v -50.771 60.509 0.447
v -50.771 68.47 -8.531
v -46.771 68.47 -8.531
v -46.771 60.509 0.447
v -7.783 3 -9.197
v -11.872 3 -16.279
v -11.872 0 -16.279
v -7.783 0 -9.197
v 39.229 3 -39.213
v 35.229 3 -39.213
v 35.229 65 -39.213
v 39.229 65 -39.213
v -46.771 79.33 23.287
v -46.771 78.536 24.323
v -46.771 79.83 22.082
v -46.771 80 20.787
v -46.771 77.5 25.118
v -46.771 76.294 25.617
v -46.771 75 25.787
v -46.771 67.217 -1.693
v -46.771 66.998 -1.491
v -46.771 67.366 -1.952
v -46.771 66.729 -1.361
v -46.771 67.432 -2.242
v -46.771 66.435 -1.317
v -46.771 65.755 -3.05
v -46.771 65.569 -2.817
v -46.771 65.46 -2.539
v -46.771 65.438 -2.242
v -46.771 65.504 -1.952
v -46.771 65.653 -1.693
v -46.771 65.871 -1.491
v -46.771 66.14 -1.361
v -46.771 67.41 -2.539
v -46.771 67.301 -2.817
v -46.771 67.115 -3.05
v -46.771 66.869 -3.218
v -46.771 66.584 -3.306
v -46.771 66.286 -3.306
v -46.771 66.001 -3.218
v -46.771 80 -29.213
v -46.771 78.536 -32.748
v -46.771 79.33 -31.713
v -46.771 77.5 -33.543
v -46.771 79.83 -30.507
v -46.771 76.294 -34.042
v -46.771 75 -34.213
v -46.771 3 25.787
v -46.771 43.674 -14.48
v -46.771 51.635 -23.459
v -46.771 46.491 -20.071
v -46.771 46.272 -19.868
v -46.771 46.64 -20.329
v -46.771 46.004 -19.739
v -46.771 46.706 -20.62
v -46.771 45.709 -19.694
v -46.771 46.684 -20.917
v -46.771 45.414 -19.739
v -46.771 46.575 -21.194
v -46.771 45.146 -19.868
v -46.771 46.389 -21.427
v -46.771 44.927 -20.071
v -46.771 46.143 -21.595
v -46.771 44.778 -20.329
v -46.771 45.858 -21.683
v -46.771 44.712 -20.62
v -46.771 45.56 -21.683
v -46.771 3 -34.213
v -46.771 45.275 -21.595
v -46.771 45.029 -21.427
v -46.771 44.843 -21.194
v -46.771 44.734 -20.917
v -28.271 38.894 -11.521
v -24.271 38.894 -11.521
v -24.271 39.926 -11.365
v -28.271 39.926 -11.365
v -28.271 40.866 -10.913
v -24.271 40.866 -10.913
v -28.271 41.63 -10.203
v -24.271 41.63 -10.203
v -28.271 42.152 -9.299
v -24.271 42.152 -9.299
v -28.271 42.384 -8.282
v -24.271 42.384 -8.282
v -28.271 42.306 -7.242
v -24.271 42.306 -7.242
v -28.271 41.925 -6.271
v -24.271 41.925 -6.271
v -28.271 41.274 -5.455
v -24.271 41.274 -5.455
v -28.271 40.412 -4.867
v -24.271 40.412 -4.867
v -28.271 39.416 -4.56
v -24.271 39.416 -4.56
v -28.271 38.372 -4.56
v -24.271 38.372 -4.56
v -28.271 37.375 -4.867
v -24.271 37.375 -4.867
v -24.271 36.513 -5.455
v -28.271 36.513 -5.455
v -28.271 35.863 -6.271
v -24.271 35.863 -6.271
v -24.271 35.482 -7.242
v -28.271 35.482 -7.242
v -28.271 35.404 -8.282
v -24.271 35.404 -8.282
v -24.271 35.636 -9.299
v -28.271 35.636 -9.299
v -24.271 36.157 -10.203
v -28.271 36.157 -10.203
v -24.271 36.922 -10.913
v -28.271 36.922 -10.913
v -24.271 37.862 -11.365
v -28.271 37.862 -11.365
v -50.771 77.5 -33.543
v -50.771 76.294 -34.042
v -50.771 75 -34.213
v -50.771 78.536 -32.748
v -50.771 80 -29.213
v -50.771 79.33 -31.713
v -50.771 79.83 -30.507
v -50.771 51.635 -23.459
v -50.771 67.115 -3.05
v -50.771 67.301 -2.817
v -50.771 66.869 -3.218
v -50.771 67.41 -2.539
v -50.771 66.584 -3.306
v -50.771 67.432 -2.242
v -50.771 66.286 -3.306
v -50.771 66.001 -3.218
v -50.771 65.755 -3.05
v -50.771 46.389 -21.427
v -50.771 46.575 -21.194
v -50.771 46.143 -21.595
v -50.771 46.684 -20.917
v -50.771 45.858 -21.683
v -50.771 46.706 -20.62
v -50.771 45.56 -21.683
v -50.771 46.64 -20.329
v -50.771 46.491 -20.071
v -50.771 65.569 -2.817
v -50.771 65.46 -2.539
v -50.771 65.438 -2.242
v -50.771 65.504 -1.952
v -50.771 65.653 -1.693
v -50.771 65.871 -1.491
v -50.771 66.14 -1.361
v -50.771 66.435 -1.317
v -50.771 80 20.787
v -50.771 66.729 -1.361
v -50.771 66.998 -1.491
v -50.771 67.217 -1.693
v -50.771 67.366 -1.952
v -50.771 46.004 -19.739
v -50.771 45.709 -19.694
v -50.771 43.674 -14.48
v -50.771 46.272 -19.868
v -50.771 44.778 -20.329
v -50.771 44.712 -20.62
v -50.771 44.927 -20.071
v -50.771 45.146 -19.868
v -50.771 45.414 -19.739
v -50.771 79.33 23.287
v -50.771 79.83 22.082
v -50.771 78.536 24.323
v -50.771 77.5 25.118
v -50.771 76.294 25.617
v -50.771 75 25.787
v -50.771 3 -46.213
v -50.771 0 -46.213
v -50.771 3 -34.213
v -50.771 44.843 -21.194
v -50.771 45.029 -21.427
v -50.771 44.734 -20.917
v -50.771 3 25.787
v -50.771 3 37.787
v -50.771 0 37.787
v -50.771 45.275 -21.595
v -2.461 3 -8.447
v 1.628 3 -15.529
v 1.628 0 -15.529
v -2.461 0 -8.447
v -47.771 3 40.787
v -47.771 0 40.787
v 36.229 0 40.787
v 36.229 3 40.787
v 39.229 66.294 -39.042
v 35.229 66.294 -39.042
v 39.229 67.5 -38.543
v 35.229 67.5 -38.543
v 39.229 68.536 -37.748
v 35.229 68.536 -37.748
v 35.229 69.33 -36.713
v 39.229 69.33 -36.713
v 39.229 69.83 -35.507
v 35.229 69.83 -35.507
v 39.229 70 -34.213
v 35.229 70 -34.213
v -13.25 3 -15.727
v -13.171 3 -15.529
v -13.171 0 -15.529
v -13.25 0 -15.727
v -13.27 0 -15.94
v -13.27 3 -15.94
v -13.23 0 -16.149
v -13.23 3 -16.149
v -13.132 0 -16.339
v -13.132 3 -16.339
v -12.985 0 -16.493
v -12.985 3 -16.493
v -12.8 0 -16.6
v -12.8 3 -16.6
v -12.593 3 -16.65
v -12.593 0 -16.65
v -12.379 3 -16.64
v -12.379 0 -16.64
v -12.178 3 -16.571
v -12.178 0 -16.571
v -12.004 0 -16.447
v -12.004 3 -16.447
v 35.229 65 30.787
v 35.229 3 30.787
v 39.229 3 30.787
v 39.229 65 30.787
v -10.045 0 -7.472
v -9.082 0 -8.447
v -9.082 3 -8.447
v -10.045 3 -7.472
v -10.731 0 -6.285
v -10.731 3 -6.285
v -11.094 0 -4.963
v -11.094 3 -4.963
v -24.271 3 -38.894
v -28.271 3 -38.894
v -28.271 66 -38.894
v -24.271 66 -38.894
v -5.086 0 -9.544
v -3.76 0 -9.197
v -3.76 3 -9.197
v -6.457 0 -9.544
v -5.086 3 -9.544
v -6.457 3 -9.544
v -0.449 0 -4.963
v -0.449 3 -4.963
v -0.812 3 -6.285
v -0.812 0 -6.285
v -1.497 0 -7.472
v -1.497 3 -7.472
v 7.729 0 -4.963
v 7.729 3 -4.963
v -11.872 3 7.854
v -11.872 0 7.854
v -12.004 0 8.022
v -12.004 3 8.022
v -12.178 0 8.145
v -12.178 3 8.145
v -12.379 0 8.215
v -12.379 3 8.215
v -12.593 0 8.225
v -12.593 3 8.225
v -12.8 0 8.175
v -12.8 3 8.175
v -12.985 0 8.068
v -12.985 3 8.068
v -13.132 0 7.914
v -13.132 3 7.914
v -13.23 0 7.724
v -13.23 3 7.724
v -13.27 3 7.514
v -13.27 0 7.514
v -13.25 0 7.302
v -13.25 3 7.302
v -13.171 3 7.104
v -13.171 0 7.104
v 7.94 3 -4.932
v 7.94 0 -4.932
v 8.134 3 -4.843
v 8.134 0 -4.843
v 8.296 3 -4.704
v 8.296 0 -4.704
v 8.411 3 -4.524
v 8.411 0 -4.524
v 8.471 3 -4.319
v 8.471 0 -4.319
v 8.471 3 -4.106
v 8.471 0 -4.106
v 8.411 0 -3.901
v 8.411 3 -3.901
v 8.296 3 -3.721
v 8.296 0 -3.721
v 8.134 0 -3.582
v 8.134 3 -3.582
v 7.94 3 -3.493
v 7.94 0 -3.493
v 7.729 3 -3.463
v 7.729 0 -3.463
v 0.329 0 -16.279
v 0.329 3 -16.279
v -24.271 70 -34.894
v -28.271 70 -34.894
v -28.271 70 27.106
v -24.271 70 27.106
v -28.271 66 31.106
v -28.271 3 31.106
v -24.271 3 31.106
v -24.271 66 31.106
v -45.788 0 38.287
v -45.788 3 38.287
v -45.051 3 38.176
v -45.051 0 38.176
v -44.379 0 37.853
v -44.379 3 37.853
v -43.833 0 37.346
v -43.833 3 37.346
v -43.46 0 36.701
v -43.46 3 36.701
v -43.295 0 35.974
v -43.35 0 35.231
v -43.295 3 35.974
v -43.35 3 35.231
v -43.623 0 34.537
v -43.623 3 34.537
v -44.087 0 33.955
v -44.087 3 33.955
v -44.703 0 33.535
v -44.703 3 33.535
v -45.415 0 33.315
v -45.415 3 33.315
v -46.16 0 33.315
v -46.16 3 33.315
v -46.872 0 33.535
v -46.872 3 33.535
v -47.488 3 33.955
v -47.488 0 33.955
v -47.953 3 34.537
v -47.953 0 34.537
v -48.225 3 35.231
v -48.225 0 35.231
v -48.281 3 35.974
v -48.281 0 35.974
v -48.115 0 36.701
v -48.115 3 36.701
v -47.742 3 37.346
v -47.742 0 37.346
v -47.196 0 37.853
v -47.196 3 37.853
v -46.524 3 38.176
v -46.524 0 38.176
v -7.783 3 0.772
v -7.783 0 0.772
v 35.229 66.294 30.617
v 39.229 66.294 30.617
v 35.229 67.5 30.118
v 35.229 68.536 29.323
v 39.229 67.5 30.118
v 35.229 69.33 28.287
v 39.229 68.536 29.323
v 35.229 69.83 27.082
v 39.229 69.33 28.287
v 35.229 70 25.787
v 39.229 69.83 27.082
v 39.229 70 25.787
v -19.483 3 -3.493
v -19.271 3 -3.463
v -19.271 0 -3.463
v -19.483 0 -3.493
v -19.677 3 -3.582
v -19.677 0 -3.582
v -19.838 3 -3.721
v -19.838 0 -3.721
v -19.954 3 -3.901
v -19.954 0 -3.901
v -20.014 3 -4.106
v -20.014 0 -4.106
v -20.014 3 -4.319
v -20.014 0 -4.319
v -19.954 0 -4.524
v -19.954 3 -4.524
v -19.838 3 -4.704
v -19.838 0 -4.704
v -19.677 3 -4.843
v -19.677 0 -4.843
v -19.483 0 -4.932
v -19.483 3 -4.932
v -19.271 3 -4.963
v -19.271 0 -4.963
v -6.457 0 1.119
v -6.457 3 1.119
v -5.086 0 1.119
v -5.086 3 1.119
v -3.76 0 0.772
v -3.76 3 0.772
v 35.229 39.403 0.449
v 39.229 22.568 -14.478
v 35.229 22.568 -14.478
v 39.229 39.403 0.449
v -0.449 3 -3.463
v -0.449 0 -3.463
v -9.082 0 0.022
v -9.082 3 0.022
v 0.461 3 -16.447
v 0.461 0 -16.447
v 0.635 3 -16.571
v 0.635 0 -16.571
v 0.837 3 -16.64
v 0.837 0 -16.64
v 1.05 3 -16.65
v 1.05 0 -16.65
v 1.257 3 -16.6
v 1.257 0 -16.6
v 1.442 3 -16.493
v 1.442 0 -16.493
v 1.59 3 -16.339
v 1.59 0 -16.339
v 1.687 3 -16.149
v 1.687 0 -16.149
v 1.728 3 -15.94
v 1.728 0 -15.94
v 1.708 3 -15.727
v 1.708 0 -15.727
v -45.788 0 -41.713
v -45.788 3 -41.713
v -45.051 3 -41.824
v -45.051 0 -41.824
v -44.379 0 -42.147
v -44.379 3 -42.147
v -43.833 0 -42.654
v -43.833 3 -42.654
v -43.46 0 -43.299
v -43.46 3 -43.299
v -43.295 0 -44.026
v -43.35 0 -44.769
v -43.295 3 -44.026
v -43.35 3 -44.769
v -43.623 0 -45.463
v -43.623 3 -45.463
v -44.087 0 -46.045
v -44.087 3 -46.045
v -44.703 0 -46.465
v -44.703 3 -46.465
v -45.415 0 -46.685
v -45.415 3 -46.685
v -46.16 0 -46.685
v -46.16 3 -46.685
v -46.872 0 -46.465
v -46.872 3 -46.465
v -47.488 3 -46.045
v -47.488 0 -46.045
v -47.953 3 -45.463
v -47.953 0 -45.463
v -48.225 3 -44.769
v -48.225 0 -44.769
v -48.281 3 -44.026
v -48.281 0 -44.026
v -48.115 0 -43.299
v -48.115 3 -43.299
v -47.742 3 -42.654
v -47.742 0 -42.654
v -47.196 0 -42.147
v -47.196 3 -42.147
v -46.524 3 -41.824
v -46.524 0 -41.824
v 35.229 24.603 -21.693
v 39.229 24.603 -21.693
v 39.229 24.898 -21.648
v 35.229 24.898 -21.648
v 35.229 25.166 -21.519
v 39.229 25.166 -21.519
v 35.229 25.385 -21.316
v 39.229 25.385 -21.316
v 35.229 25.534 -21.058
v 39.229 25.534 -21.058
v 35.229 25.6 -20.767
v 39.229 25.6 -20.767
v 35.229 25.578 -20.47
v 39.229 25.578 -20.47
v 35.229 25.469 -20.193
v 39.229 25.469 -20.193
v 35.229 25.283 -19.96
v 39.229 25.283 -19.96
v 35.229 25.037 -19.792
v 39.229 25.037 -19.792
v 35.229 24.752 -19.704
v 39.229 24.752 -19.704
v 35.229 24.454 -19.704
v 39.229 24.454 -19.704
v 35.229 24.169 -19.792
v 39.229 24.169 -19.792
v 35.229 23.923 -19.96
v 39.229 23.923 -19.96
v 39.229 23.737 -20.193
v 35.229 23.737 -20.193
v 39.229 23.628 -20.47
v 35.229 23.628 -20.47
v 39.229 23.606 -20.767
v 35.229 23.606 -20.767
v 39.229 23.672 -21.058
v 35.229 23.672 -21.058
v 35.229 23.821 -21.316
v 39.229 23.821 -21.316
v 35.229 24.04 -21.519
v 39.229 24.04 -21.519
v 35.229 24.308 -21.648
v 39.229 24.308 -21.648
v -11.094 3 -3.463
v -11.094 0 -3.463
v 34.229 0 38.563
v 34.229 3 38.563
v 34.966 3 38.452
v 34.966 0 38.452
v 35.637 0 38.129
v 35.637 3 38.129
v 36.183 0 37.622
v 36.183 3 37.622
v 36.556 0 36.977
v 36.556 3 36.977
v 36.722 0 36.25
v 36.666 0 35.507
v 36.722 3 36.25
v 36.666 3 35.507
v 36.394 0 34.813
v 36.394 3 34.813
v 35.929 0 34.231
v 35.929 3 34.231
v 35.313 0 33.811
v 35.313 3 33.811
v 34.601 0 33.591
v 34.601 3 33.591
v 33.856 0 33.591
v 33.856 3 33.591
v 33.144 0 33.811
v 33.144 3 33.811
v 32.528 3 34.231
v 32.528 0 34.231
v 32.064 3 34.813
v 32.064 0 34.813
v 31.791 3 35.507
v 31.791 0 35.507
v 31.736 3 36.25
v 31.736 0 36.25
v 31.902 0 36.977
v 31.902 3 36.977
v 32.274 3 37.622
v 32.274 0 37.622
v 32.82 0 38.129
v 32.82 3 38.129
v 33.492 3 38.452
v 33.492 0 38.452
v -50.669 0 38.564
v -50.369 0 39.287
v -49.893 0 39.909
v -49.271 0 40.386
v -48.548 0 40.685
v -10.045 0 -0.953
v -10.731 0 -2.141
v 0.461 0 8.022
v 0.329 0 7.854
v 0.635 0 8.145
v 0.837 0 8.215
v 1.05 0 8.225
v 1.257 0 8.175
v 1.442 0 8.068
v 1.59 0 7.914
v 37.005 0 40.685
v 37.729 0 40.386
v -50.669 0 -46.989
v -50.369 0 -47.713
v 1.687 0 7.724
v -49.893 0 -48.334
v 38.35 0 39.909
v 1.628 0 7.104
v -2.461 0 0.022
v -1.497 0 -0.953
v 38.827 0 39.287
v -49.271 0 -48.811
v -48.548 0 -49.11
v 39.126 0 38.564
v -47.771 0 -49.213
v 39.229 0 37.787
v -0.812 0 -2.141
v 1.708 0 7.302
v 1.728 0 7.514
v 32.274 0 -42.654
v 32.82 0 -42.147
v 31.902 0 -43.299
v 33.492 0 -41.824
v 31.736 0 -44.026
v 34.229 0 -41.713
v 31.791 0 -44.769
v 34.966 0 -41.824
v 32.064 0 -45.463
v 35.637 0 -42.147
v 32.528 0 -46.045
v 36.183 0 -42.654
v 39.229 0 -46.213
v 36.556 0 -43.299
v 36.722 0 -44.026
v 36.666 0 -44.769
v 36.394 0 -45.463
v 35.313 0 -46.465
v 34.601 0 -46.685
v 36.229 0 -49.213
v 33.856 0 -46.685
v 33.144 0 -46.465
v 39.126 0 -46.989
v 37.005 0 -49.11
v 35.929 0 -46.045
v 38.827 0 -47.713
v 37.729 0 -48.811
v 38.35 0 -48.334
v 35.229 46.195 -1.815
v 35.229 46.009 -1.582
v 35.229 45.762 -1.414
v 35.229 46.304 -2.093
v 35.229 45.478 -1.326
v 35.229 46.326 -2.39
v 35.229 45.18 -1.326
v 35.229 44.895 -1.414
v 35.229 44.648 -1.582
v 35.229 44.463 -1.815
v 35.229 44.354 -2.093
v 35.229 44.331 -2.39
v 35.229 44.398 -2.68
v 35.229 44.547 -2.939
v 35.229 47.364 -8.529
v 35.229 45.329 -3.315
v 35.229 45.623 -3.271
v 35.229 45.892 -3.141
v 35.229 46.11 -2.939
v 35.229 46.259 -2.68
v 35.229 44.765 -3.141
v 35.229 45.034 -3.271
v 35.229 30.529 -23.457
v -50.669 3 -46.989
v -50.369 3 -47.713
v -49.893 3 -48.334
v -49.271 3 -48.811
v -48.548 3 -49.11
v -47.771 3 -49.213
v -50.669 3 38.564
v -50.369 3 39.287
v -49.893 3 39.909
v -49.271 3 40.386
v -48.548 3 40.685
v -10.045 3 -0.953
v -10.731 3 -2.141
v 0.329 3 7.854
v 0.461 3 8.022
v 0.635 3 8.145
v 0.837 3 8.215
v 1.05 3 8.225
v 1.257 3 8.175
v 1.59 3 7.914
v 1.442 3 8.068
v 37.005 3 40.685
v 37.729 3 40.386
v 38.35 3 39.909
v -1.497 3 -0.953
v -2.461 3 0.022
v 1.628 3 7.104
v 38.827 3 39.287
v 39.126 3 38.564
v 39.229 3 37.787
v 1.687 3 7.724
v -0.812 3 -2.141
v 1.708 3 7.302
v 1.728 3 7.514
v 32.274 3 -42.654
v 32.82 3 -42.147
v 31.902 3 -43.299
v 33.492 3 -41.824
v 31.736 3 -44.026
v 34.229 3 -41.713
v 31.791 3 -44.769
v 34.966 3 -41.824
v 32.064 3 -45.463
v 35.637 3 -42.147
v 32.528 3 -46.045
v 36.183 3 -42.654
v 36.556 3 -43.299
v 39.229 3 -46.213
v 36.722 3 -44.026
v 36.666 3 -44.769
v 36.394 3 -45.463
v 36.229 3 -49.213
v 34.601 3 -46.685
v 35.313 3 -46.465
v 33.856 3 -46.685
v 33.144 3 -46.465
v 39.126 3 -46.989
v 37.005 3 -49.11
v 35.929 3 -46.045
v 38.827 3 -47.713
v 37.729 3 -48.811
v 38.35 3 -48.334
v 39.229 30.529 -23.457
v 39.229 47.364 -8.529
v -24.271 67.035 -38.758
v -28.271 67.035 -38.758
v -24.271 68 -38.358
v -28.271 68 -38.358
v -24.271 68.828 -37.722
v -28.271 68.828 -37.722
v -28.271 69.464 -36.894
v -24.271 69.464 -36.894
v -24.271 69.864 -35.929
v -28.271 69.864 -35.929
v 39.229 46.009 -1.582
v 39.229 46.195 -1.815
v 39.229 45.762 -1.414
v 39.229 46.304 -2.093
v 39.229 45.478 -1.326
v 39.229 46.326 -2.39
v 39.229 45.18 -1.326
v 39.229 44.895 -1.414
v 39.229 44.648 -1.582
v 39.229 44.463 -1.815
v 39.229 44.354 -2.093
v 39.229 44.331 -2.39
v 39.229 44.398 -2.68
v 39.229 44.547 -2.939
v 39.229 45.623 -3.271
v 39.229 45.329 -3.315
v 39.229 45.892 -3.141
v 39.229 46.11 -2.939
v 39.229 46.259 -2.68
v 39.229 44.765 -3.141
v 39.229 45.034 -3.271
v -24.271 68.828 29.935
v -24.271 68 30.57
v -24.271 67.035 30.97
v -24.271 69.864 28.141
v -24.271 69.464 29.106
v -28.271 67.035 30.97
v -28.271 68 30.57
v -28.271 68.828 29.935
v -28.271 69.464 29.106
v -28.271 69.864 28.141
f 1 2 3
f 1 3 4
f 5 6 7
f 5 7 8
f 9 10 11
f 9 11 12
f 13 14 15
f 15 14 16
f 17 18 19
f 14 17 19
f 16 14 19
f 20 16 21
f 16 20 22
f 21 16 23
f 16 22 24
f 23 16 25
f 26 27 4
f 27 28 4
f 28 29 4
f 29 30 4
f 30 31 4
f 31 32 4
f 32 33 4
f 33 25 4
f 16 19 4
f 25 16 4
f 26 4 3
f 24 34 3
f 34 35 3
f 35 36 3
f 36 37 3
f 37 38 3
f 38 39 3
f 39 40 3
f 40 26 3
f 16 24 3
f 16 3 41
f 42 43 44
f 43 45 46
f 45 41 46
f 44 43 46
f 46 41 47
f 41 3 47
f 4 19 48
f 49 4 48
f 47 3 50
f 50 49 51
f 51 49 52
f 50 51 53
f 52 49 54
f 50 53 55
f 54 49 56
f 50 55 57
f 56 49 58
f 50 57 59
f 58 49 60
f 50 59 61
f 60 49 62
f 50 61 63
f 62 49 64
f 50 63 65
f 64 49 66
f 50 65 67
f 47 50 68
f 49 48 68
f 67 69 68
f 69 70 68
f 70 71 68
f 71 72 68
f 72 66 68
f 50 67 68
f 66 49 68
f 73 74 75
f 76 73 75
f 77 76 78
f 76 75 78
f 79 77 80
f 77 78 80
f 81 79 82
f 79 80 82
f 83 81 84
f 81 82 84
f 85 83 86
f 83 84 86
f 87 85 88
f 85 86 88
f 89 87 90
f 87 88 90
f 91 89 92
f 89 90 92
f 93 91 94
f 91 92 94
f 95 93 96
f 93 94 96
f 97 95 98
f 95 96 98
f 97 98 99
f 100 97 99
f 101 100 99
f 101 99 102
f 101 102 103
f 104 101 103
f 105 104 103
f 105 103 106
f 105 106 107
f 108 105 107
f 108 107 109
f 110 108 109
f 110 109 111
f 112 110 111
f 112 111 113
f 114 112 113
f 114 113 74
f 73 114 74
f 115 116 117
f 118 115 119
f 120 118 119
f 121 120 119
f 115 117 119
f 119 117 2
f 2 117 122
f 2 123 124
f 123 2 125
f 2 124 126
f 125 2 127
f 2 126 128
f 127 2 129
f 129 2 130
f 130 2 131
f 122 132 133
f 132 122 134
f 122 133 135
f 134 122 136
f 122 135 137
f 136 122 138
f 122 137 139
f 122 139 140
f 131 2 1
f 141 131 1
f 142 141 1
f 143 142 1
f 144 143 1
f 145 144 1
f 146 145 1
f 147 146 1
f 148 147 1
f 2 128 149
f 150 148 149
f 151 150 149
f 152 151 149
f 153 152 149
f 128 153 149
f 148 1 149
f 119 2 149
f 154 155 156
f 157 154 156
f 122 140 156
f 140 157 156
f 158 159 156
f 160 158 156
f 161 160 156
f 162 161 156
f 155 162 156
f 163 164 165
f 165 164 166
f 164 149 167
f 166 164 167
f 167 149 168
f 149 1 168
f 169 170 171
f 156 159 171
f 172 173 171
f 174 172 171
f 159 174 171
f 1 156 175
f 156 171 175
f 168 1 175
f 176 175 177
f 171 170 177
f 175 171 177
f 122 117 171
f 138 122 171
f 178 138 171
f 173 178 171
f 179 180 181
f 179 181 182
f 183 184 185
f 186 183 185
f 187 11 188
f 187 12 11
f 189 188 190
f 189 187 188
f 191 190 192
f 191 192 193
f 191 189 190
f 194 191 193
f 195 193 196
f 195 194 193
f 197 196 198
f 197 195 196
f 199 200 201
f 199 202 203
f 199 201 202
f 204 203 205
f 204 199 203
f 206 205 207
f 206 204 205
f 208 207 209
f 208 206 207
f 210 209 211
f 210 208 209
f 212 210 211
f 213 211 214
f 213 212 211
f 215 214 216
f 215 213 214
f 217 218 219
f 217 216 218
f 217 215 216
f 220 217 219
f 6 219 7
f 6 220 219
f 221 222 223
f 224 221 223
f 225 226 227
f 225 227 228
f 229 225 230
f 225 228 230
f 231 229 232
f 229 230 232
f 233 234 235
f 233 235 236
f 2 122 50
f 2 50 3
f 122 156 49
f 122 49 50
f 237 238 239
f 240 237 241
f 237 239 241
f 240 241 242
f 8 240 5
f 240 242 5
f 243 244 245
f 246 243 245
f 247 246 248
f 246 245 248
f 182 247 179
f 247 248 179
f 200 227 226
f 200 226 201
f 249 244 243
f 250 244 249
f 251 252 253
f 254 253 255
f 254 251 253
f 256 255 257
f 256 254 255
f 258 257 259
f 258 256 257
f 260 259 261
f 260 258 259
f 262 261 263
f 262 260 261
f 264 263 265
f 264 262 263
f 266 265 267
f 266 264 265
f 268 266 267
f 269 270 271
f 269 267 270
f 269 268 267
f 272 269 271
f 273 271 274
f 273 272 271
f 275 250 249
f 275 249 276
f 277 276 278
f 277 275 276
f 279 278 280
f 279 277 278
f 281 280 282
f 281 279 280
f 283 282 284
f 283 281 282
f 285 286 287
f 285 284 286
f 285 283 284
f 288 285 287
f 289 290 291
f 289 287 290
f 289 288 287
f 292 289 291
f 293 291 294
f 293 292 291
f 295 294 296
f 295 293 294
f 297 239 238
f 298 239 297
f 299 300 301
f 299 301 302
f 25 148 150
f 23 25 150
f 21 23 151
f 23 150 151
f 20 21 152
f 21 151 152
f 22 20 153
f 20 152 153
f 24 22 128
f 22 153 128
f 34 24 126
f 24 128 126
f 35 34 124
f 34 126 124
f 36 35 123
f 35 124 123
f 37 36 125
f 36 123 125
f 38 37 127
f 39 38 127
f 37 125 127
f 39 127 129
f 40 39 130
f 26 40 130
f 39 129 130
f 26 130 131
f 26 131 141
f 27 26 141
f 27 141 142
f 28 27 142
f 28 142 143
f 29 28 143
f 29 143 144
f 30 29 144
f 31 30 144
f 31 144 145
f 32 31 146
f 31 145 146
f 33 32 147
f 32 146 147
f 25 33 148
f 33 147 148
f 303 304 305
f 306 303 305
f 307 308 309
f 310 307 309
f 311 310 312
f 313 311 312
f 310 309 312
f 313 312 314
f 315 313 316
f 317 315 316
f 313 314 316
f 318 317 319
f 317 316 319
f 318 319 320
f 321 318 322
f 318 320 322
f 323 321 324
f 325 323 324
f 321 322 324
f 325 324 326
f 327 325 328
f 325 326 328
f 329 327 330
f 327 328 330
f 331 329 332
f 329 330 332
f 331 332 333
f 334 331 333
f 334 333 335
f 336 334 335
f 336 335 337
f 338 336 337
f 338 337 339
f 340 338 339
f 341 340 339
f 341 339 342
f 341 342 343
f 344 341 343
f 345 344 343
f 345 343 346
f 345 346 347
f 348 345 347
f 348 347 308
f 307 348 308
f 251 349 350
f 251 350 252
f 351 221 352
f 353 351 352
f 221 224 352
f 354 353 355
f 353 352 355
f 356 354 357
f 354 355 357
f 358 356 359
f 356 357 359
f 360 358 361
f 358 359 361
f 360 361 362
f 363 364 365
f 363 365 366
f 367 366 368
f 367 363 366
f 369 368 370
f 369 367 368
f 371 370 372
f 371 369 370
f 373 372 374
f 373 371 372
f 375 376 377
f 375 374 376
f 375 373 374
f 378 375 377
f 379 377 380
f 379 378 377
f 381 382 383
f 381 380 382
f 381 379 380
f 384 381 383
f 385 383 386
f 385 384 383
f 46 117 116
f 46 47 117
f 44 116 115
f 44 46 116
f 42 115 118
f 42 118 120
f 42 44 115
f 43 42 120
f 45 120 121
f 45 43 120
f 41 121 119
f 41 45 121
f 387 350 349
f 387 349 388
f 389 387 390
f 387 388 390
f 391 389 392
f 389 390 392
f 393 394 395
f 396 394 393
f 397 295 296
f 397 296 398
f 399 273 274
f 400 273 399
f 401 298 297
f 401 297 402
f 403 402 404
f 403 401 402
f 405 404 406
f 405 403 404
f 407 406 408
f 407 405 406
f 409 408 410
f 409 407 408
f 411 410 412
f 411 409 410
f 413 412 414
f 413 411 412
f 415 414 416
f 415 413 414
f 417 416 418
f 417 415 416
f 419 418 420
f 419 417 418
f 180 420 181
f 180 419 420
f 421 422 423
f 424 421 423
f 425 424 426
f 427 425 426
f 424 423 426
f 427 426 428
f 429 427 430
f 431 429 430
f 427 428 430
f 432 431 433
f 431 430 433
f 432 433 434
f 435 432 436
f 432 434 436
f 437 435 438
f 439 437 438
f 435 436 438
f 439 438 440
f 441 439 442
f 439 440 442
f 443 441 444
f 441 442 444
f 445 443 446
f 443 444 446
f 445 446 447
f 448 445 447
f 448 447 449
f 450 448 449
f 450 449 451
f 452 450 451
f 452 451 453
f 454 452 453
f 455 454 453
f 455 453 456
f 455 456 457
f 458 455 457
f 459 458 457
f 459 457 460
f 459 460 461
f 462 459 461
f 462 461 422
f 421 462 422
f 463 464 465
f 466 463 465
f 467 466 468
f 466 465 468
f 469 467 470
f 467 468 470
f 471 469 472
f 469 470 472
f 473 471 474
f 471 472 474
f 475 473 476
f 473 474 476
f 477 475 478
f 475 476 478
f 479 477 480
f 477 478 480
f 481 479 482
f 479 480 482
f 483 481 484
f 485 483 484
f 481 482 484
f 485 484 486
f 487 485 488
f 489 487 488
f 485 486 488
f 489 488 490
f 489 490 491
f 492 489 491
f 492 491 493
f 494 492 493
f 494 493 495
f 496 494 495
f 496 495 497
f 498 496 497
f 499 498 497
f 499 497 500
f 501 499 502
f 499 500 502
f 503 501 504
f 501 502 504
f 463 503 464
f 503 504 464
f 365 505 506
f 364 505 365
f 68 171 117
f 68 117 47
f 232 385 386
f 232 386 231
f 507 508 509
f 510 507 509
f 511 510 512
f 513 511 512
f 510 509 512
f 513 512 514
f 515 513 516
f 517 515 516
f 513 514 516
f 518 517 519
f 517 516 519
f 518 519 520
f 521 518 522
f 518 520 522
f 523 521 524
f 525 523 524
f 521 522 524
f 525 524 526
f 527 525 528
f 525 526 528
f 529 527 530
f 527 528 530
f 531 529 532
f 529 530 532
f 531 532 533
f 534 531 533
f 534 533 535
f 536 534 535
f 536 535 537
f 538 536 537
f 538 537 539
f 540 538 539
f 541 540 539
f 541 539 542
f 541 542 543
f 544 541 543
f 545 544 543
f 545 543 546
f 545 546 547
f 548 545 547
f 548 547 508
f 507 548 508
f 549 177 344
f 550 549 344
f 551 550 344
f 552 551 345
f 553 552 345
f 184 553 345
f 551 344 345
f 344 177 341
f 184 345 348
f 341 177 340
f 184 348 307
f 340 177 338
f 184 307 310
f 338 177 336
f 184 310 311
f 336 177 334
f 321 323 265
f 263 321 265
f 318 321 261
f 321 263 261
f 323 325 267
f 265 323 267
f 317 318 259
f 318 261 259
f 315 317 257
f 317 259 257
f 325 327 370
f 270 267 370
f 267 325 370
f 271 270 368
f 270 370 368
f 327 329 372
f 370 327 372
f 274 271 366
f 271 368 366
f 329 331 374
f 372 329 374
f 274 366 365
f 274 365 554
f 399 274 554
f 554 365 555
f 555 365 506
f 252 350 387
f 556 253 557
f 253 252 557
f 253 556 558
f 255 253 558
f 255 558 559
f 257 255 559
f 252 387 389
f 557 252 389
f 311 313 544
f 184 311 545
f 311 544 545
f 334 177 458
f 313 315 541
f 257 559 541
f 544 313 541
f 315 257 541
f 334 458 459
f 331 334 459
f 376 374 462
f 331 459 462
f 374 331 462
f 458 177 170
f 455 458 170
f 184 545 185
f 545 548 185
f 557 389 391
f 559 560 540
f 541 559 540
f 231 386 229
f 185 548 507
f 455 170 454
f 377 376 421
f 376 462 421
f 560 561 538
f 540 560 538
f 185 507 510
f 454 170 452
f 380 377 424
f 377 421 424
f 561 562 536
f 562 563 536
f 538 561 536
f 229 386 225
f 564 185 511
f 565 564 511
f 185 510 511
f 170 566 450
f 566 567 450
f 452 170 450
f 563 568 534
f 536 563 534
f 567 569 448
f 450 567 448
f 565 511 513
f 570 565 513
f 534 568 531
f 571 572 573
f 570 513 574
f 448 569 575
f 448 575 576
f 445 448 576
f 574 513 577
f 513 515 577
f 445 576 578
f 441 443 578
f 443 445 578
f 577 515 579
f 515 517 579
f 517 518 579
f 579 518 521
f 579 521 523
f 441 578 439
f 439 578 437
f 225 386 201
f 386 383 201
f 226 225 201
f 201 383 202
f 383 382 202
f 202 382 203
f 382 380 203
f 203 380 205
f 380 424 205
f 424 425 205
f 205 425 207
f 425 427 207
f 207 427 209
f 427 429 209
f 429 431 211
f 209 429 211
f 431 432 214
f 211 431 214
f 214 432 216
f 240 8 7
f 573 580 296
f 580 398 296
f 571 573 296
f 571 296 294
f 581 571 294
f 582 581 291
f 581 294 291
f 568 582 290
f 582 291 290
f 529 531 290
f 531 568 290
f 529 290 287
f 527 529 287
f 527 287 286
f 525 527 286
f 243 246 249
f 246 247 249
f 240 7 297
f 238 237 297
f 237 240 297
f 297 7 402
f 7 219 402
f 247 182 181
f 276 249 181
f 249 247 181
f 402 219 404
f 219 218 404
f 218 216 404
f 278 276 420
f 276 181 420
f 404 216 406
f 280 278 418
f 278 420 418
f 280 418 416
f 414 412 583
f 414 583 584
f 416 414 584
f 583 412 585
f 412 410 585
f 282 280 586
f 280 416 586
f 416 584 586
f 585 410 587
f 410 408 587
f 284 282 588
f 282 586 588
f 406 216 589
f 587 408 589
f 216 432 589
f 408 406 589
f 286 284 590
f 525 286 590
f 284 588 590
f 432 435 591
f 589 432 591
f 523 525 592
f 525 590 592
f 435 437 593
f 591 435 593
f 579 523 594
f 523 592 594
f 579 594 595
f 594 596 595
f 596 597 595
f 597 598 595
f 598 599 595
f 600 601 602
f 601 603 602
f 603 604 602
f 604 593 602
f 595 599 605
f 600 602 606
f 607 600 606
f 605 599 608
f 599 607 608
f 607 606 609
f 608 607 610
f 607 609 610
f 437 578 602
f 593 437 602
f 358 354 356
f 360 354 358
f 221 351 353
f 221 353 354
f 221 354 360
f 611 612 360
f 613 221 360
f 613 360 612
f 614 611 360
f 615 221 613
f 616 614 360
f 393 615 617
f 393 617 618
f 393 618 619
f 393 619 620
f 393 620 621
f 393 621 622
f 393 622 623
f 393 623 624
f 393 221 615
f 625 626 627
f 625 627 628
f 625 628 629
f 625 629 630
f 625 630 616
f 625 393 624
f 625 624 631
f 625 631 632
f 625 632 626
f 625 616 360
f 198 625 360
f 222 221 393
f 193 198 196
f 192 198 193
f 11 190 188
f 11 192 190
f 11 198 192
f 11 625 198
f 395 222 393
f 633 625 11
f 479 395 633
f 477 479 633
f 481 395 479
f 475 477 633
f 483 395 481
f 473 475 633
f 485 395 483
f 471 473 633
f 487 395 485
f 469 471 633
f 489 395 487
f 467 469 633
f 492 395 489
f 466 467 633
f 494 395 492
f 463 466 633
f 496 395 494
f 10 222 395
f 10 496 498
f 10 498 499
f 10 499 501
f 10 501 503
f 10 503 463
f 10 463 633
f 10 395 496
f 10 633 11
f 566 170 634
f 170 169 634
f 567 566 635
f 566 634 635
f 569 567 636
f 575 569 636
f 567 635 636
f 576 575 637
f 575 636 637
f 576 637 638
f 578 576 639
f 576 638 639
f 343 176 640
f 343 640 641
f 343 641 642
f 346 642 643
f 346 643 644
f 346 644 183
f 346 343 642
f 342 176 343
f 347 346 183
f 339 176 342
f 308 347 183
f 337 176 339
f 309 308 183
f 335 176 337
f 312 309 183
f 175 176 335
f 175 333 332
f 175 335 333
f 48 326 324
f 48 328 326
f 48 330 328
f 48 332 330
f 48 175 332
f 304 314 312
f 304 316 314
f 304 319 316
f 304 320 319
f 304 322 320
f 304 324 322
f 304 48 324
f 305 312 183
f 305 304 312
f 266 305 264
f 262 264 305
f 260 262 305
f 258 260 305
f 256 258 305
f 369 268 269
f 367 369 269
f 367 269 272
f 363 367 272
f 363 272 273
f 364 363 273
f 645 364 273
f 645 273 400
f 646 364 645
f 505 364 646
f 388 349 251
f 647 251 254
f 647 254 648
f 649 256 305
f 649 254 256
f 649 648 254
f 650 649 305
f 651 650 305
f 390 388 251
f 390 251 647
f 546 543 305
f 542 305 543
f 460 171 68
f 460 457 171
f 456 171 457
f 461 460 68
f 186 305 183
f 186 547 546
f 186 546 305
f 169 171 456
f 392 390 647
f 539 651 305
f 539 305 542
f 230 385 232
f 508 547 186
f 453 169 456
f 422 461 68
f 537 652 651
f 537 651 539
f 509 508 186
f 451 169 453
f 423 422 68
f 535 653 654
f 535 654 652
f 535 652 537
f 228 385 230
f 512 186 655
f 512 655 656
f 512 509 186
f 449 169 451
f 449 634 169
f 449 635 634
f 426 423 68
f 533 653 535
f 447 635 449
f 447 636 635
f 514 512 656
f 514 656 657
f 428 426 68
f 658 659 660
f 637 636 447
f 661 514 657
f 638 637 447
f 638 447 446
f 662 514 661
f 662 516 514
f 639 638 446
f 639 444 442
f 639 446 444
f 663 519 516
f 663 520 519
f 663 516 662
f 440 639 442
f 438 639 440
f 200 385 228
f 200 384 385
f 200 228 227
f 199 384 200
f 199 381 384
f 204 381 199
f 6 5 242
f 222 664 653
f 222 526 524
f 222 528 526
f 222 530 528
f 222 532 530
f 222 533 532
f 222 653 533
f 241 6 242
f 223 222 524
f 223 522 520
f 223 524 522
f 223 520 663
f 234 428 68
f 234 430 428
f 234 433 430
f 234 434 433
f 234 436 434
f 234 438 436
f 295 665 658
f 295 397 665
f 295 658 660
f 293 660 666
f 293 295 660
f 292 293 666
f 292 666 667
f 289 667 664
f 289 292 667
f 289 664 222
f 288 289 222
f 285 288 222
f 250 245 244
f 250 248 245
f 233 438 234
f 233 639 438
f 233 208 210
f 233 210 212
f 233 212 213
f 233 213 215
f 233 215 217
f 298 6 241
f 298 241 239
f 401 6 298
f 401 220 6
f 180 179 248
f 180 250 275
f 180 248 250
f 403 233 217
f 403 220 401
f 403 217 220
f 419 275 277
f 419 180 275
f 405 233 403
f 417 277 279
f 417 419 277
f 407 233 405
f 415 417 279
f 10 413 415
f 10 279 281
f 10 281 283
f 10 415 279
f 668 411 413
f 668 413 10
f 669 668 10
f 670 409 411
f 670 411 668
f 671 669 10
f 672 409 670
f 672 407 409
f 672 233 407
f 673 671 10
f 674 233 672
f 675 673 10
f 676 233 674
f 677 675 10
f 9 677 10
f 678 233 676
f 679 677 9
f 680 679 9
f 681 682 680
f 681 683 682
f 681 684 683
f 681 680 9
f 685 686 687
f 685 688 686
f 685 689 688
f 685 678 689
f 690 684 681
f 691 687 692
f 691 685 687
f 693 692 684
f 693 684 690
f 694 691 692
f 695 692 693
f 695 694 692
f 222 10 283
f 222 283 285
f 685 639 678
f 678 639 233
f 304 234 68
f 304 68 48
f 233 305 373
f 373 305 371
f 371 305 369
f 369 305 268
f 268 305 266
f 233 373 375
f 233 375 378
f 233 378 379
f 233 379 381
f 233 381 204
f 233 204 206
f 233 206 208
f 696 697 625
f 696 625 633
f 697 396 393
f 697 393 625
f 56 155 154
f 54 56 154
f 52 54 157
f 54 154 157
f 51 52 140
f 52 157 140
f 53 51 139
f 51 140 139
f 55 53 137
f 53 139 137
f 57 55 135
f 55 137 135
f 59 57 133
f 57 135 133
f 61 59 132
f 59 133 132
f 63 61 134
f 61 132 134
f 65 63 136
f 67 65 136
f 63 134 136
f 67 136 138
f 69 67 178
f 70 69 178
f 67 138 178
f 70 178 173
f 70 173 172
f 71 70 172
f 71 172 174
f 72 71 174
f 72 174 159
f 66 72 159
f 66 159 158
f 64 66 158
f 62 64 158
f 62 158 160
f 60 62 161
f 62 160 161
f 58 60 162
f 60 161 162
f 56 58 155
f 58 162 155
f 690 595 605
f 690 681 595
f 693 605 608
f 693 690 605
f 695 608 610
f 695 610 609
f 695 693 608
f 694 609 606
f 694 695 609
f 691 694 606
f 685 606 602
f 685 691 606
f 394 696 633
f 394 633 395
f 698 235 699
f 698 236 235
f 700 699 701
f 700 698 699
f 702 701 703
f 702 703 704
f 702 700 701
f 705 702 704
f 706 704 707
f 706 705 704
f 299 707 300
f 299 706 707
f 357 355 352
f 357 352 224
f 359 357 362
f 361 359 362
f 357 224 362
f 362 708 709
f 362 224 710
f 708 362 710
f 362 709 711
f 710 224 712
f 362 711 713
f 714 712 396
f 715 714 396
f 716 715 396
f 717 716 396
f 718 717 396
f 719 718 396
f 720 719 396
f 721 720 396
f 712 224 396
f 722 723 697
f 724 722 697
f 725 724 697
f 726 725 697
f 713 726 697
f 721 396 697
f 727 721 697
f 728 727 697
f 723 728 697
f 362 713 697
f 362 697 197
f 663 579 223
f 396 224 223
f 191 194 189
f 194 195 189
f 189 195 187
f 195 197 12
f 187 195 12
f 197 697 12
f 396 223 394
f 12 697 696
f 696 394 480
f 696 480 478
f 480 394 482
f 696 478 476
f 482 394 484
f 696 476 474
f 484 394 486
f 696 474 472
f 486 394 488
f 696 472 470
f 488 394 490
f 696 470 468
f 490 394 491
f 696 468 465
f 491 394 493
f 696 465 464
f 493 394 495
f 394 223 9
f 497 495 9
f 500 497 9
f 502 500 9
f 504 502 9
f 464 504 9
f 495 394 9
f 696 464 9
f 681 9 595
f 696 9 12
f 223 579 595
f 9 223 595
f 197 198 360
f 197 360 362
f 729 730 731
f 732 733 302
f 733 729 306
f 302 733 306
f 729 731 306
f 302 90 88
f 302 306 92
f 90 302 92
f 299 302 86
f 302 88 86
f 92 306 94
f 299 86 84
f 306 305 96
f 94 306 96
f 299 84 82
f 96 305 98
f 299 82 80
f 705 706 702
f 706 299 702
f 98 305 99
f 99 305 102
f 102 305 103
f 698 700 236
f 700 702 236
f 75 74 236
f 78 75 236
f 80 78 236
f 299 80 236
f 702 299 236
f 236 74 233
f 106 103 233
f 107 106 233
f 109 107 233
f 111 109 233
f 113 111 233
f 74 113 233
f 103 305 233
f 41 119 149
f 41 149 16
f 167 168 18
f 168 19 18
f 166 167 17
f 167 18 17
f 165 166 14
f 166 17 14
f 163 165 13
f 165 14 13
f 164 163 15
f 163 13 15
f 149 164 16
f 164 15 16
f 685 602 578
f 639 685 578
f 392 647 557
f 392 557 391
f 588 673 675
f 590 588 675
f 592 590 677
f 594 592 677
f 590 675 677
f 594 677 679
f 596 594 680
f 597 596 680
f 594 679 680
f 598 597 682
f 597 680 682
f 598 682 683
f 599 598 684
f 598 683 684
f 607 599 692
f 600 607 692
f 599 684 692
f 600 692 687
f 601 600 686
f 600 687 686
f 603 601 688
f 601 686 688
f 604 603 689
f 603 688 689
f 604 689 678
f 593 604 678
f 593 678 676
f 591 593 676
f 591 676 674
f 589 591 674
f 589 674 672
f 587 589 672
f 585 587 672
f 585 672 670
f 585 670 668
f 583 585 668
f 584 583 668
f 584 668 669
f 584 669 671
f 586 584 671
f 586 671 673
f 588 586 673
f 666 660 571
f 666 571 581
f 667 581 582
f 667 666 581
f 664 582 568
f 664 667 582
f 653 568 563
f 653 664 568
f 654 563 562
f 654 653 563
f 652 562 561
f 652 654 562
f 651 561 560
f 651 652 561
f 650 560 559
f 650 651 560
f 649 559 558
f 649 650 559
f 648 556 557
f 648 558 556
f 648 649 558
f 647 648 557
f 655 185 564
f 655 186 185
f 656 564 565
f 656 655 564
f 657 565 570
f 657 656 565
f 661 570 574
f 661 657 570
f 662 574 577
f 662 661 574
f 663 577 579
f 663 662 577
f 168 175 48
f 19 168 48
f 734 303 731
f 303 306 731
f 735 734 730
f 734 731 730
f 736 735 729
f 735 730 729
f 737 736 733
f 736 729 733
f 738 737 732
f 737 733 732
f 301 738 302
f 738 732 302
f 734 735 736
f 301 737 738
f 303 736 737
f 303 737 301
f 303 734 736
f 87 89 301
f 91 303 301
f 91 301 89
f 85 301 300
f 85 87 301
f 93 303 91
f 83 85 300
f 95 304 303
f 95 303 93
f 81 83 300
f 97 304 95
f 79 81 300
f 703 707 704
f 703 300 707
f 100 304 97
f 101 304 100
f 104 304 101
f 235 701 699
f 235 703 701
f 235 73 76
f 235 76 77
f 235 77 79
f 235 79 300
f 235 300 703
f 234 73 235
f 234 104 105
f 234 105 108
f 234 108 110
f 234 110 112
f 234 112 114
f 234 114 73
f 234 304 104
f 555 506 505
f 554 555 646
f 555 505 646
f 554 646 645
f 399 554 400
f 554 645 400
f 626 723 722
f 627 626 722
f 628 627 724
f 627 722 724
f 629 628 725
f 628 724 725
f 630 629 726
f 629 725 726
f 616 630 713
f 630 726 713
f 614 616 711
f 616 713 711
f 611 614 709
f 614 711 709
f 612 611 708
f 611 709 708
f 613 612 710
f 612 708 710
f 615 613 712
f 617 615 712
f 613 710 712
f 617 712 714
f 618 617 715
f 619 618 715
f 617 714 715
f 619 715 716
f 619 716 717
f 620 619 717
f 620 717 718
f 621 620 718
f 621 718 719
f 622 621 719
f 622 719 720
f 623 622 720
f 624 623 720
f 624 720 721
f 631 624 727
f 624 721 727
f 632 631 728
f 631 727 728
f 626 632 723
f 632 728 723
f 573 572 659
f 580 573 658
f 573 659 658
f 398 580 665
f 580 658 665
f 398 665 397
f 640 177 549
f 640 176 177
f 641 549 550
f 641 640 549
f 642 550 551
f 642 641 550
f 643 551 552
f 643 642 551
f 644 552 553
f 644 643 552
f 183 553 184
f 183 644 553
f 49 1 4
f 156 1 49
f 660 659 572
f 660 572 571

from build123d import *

# Parameters (mm, degrees)
SKETCH1_W           = 4
SKETCH1_H           = 70
SKETCH1_H_2         = 60
BOSS_EXTRUDE1_DEPTH = 3
SKETCH1_3_W         = 4
SKETCH1_3_H         = 60
SKETCH1_3_H_2       = 70
BOSS_EXTRUDE2_DEPTH = 70
SKETCH1_4_W         = 4
SKETCH1_4_H         = 70
BOSS_EXTRUDE3_DEPTH = 70
SKETCH5_R           = 4
CUT_EXTRUDE4_DEPTH  = 10
SKETCH6_R           = 2.5
CUT_EXTRUDE5_DEPTH  = 10
SKETCH1_5_W         = 4
SKETCH1_5_H         = 60
BOSS_EXTRUDE4_DEPTH = 80
SKETCH5_2_R         = 4
CUT_EXTRUDE6_DEPTH  = 10
FILLET1_R           = 3
FILLET2_R           = 5
FILLET3_R           = 4
SKETCH7_R           = 2.5
CUT_EXTRUDE7_DEPTH  = 10
SKETCH8_R           = 2.5
CUT_EXTRUDE8_DEPTH  = 10
CUT_EXTRUDE9_REACH  = 132.084
SKETCH9_R           = 3.5
SKETCH26_R          = 2.5
CUT_EXTRUDE11_DEPTH = 10
CUT_EXTRUDE14_DEPTH = 10
CUT_EXTRUDE15_DEPTH = 10
SKETCH28_R          = 1
SKETCH28_R_2        = 4
CUT_EXTRUDE16_DEPTH = 4
SKETCH29_R          = 1
SKETCH29_R_2        = 3.5
CUT_EXTRUDE18_DEPTH = 4
SKETCH31_R          = 5.375
CUT_EXTRUDE19_DEPTH = 10


with BuildPart() as part:
    # Sketch1 → Boss-Extrude1 (new body)
    # profile 1 of 4: a face of its own
    with BuildSketch(Plane(origin=(0, 0, 0), x_dir=(1, 0, 0), z_dir=(0, 1, 0))):
        Polygon((-50.771305032, 49.212548619), (-50.771305032, 34.212548619), (-46.771305032, 34.212548619), (-46.771305032, -25.787451381), (-50.771305032, -25.787451381), (-50.771305032, -40.787451381), (39.228694968, -40.787451381), (39.228694968, -30.787451381), (35.228694968, -30.787451381), (35.228694968, 39.212548619), (39.228694968, 39.212548619), (39.228694968, 49.212548619), align=None)
        with Locations((-26.271305032, 3.893815937)):
            Rectangle(SKETCH1_W, SKETCH1_H, mode=Mode.SUBTRACT)
    # profile 2 of 4: a face of its own
    with BuildSketch(Plane(origin=(0, 0, 0), x_dir=(1, 0, 0), z_dir=(0, 1, 0))):
        with Locations((37.228694968, 4.212548619)):
            Rectangle(SKETCH1_W, SKETCH1_H)
    # profile 3 of 4: a face of its own
    with BuildSketch(Plane(origin=(0, 0, 0), x_dir=(1, 0, 0), z_dir=(0, 1, 0))):
        with Locations((-48.771305032, 4.212548619)):
            Rectangle(SKETCH1_W, SKETCH1_H_2)
    # profile 4 of 4: a face of its own
    with BuildSketch(Plane(origin=(0, 0, 0), x_dir=(1, 0, 0), z_dir=(0, 1, 0))):
        with Locations((-26.271305032, 3.893815937)):
            Rectangle(SKETCH1_W, SKETCH1_H)
    extrude(amount=BOSS_EXTRUDE1_DEPTH)

    # Sketch1<3> → Boss-Extrude2 (add)
    with BuildSketch(Plane(origin=(0, 0, 0), x_dir=(1, 0, 0), z_dir=(0, 1, 0))):
        with Locations((-48.771305032, 4.212548619)):
            Rectangle(SKETCH1_3_W, SKETCH1_3_H)
        with Locations((37.228694968, 4.212548619)):
            Rectangle(SKETCH1_3_W, SKETCH1_3_H_2)
    extrude(amount=BOSS_EXTRUDE2_DEPTH)

    # Sketch1<4> → Boss-Extrude3 (add)
    with BuildSketch(Plane(origin=(0, 0, 0), x_dir=(1, 0, 0), z_dir=(0, 1, 0))):
        with Locations((-26.271305032, 3.893815937)):
            Rectangle(SKETCH1_4_W, SKETCH1_4_H)
    extrude(amount=BOSS_EXTRUDE3_DEPTH)

    # Sketch5 → Cut-Extrude4 (cut)
    with BuildSketch(Plane.ZY.offset(50.771305032)):
        with Locations((-8.022548619, 60)):
            Circle(SKETCH5_R)
    extrude(amount=-CUT_EXTRUDE4_DEPTH, mode=Mode.SUBTRACT)

    # Sketch6 → Cut-Extrude5 (cut)
    with BuildSketch(Plane(origin=(0, 3, 0), x_dir=(1, 0, 0), z_dir=(0, 1, 0))):
        with Locations(Location((-45.787574368, -35.787451381, 0), (0, 0, 270))):
            Circle(SKETCH6_R)
        with Locations(Location((-45.787574368, 44.212548619, 0), (0, 0, 270))):
            Circle(SKETCH6_R)
        with Locations((43.718511914, 44.212548619)):
            Circle(SKETCH6_R)
        with Locations((43.718511914, -35.787451381)):
            Circle(SKETCH6_R)
    extrude(amount=-CUT_EXTRUDE5_DEPTH, mode=Mode.SUBTRACT)

    # Sketch1<5> → Boss-Extrude4 (add)
    with BuildSketch(Plane(origin=(0, 0, 0), x_dir=(1, 0, 0), z_dir=(0, 1, 0))):
        with Locations((-48.771305032, 4.212548619)):
            Rectangle(SKETCH1_5_W, SKETCH1_5_H)
    extrude(amount=BOSS_EXTRUDE4_DEPTH)

    # Sketch5<2> → Cut-Extrude6 (cut)
    with BuildSketch(Plane.ZY.offset(50.771305032)):
        with Locations((-8.022548619, 60)):
            Circle(SKETCH5_2_R)
    extrude(amount=-CUT_EXTRUDE6_DEPTH, mode=Mode.SUBTRACT)

    # Fillet1
    fillet1_edges = [part.edges().sort_by_distance(p)[0] for p in [
        (-50.771305032, 1.5, 40.787451381),
        (-50.771305032, 1.5, -49.212548619),
        (39.228694968, 1.5, -49.212548619),
        (39.228694968, 1.5, 40.787451381),
    ]]
    fillet(fillet1_edges, radius=FILLET1_R)

    # Fillet2
    fillet2_edges = [part.edges().sort_by_distance(p)[0] for p in [
        (-48.771305032, 80, -34.212548619),
        (-48.771305032, 80, 25.787451381),
        (37.228694968, 70, -39.212548619),
        (37.228694968, 70, 30.787451381),
    ]]
    fillet(fillet2_edges, radius=FILLET2_R)

    # Fillet3
    fillet3_edges = [part.edges().sort_by_distance(p)[0] for p in [
        (-26.271305032, 70, 31.106184063),
        (-26.271305032, 70, -38.893815937),
    ]]
    fillet(fillet3_edges, radius=FILLET3_R)

    # Sketch7 → Cut-Extrude7 (cut)
    with BuildSketch(Plane(origin=(39.228694968, 0, 0), x_dir=(0, 0, -1), z_dir=(1, 0, 0))):
        with Locations((27.482306935, -10)):
            Circle(SKETCH7_R)
    extrude(amount=-CUT_EXTRUDE7_DEPTH, mode=Mode.SUBTRACT)

    # Sketch8 → Cut-Extrude8 (cut)
    with BuildSketch(Plane(origin=(39.228694968, 0, 0), x_dir=(0, 0, -1), z_dir=(1, 0, 0))):
        with Locations((8.02072759, 38.893893193)):
            Circle(SKETCH8_R)
    extrude(amount=-CUT_EXTRUDE8_DEPTH, mode=Mode.SUBTRACT)

    # Cut-Extrude9: up to this face of the body (flat: up to its plane)
    cut_extrude9_end = Plane(part.part.faces().sort_by_distance((-28.271305032, 36.452186393, -3.893815937))[0])
    # Sketch9 → Cut-Extrude9 (cut, up to the picked face)
    with BuildSketch(Plane(origin=(39.228694968, 0, 0), x_dir=(0, 0, -1), z_dir=(1, 0, 0)), mode=Mode.PRIVATE) as cut_extrude9_sk1:
        with Locations((8.02072759, 38.893893193)):
            Circle(SKETCH9_R)
    cut_extrude9_tool1 = split(extrude(cut_extrude9_sk1.sketch, amount=-CUT_EXTRUDE9_REACH, mode=Mode.PRIVATE), bisect_by=cut_extrude9_end, keep=Keep.BOTH, mode=Mode.PRIVATE)
    add(cut_extrude9_tool1.solids().sort_by(Axis((39.228695, 38.893893, -8.020728), (-1, 0, 0)))[0], mode=Mode.SUBTRACT)

    # Sketch26 → Cut-Extrude11 (cut)
    with BuildSketch(Plane(origin=(0, 3, 0), x_dir=(1, 0, 0), z_dir=(0, 1, 0))):
        with Locations(Location((34.228694968, -36.063353705, 0), (0, 0, 270))):
            Circle(SKETCH26_R)
        with Locations(Location((34.228694968, 44.212548619, 0), (0, 0, 270))):
            Circle(SKETCH26_R)
    extrude(amount=-CUT_EXTRUDE11_DEPTH, mode=Mode.SUBTRACT)

    # Sketch27 → Cut-Extrude14 (cut)
    with BuildSketch(Plane(origin=(0, 3, 0), x_dir=(1, 0, 0), z_dir=(0, 1, 0))):
        with BuildLine():
            Line((7.728694968, 3.462548619), (-19.271305032, 3.462548619))
            ThreePointArc((-19.271305032, 3.462548619), (-20.021305032, 4.212548619), (-19.271305032, 4.962548619))
            Line((-19.271305032, 4.962548619), (7.728694968, 4.962548619))
            ThreePointArc((7.728694968, 4.962548619), (8.478694968, 4.212548619), (7.728694968, 3.462548619))
        make_face()
        with BuildLine():
            Line((0.329175915, -7.853794332), (-13.170824085, 15.52889157))
            ThreePointArc((-13.170824085, 15.52889157), (-12.896305032, 16.553410623), (-11.871785979, 16.27889157))
            Line((-11.871785979, 16.27889157), (1.628214021, -7.103794332))
            ThreePointArc((1.628214021, -7.103794332), (1.353694968, -8.128313385), (0.329175915, -7.853794332))
        make_face()
        with BuildLine():
            Line((-13.170824085, -7.103794332), (0.329175915, 16.27889157))
            ThreePointArc((0.329175915, 16.27889157), (1.353694968, 16.553410623), (1.628214021, 15.52889157))
            Line((1.628214021, 15.52889157), (-11.871785979, -7.853794332))
            ThreePointArc((-11.871785979, -7.853794332), (-12.896305032, -8.128313385), (-13.170824085, -7.103794332))
        make_face()
    extrude(amount=-CUT_EXTRUDE14_DEPTH, mode=Mode.SUBTRACT)

    # Sketch27<7> → Cut-Extrude15 (cut)
    with BuildSketch(Plane(origin=(0, 3, 0), x_dir=(1, 0, 0), z_dir=(0, 1, 0))):
        with BuildLine():
            Line((-7.743699741, 2.296260771), (-7.070343138, 3.462548619))
            Line((-7.070343138, 3.462548619), (-8.417056343, 3.462548619))
            ThreePointArc((-8.417056343, 3.462548619), (-8.152874893, 2.837548619), (-7.743699741, 2.296260771))
        make_face()
        with BuildLine():
            Line((-8.417056343, 4.962548619), (-7.070343138, 4.962548619))
            Line((-7.070343138, 4.962548619), (-7.743699741, 6.128836466))
            ThreePointArc((-7.743699741, 6.128836466), (-8.152874893, 5.587548619), (-8.417056343, 4.962548619))
        make_face()
        with BuildLine():
            Line((-5.771305032, 5.712548619), (-5.09794843, 6.878836466))
            ThreePointArc((-5.09794843, 6.878836466), (-5.771305032, 6.962548619), (-6.444661635, 6.878836466))
            Line((-6.444661635, 6.878836466), (-5.771305032, 5.712548619))
        make_face()
        with BuildLine():
            Line((-4.472266927, 4.962548619), (-3.125553721, 4.962548619))
            ThreePointArc((-3.125553721, 4.962548619), (-3.389735172, 5.587548619), (-3.798910324, 6.128836466))
            Line((-3.798910324, 6.128836466), (-4.472266927, 4.962548619))
        make_face()
        with BuildLine():
            ThreePointArc((-3.798910324, 2.296260771), (-3.389735172, 2.837548619), (-3.125553721, 3.462548619))
            Line((-3.125553721, 3.462548619), (-4.472266927, 3.462548619))
            Line((-4.472266927, 3.462548619), (-3.798910324, 2.296260771))
        make_face()
        with BuildLine():
            ThreePointArc((-6.444661635, 1.546260771), (-5.771305032, 1.462548619), (-5.09794843, 1.546260771))
            Line((-5.09794843, 1.546260771), (-5.771305032, 2.712548619))
            Line((-5.771305032, 2.712548619), (-6.444661635, 1.546260771))
        make_face()
    extrude(amount=-CUT_EXTRUDE15_DEPTH, mode=Mode.SUBTRACT)

    # Sketch28 → Cut-Extrude16 (cut)
    # profile 1 of 3: a face of its own
    with BuildSketch(Plane.ZY.offset(50.771305032)):
        with Locations((-2.316893756, 66.434710762)):
            Circle(SKETCH28_R)
    # profile 2 of 3: a face of its own
    with BuildSketch(Plane.ZY.offset(50.771305032)):
        with Locations((-20.69441, 45.708956331)):
            Circle(SKETCH28_R)
    # profile 3 of 3: a face of its own
    with BuildSketch(Plane.ZY.offset(50.771305032)):
        Polygon((-23.458777666, 51.635023443), (-8.531192269, 68.470022529), (0.44747391, 60.508643651), (-14.480111487, 43.673644564), align=None)
        with Locations((-8.022548619, 60)):
            Circle(SKETCH28_R_2, mode=Mode.SUBTRACT)
    extrude(amount=-CUT_EXTRUDE16_DEPTH, mode=Mode.SUBTRACT)

    # Sketch29 → Cut-Extrude18 (cut)
    # profile 1 of 3: a face of its own
    with BuildSketch(Plane(origin=(39.228694968, 0, 0), x_dir=(0, 0, -1), z_dir=(1, 0, 0))):
        with Locations((2.315072727, 45.328603955)):
            Circle(SKETCH29_R)
    # profile 2 of 3: a face of its own
    with BuildSketch(Plane(origin=(39.228694968, 0, 0), x_dir=(0, 0, -1), z_dir=(1, 0, 0))):
        with Locations((20.692588971, 24.602849525)):
            Circle(SKETCH29_R)
    # profile 3 of 3: a face of its own
    with BuildSketch(Plane(origin=(39.228694968, 0, 0), x_dir=(0, 0, -1), z_dir=(1, 0, 0))):
        Polygon((8.529371241, 47.363915722), (23.456956637, 30.528916636), (14.478290458, 22.567537758), (-0.449294939, 39.402536844), align=None)
        with Locations((8.02072759, 38.893893193)):
            Circle(SKETCH29_R_2, mode=Mode.SUBTRACT)
    extrude(amount=-CUT_EXTRUDE18_DEPTH, mode=Mode.SUBTRACT)

    # Sketch31 → Cut-Extrude19 (cut)
    with BuildSketch(Plane(origin=(0, 3, 0), x_dir=(1, 0, 0), z_dir=(0, 1, 0))):
        with Locations((-5.771305032, 4.212548619)):
            Circle(SKETCH31_R)
    extrude(amount=-CUT_EXTRUDE19_DEPTH, mode=Mode.SUBTRACT)


solid = part.part
